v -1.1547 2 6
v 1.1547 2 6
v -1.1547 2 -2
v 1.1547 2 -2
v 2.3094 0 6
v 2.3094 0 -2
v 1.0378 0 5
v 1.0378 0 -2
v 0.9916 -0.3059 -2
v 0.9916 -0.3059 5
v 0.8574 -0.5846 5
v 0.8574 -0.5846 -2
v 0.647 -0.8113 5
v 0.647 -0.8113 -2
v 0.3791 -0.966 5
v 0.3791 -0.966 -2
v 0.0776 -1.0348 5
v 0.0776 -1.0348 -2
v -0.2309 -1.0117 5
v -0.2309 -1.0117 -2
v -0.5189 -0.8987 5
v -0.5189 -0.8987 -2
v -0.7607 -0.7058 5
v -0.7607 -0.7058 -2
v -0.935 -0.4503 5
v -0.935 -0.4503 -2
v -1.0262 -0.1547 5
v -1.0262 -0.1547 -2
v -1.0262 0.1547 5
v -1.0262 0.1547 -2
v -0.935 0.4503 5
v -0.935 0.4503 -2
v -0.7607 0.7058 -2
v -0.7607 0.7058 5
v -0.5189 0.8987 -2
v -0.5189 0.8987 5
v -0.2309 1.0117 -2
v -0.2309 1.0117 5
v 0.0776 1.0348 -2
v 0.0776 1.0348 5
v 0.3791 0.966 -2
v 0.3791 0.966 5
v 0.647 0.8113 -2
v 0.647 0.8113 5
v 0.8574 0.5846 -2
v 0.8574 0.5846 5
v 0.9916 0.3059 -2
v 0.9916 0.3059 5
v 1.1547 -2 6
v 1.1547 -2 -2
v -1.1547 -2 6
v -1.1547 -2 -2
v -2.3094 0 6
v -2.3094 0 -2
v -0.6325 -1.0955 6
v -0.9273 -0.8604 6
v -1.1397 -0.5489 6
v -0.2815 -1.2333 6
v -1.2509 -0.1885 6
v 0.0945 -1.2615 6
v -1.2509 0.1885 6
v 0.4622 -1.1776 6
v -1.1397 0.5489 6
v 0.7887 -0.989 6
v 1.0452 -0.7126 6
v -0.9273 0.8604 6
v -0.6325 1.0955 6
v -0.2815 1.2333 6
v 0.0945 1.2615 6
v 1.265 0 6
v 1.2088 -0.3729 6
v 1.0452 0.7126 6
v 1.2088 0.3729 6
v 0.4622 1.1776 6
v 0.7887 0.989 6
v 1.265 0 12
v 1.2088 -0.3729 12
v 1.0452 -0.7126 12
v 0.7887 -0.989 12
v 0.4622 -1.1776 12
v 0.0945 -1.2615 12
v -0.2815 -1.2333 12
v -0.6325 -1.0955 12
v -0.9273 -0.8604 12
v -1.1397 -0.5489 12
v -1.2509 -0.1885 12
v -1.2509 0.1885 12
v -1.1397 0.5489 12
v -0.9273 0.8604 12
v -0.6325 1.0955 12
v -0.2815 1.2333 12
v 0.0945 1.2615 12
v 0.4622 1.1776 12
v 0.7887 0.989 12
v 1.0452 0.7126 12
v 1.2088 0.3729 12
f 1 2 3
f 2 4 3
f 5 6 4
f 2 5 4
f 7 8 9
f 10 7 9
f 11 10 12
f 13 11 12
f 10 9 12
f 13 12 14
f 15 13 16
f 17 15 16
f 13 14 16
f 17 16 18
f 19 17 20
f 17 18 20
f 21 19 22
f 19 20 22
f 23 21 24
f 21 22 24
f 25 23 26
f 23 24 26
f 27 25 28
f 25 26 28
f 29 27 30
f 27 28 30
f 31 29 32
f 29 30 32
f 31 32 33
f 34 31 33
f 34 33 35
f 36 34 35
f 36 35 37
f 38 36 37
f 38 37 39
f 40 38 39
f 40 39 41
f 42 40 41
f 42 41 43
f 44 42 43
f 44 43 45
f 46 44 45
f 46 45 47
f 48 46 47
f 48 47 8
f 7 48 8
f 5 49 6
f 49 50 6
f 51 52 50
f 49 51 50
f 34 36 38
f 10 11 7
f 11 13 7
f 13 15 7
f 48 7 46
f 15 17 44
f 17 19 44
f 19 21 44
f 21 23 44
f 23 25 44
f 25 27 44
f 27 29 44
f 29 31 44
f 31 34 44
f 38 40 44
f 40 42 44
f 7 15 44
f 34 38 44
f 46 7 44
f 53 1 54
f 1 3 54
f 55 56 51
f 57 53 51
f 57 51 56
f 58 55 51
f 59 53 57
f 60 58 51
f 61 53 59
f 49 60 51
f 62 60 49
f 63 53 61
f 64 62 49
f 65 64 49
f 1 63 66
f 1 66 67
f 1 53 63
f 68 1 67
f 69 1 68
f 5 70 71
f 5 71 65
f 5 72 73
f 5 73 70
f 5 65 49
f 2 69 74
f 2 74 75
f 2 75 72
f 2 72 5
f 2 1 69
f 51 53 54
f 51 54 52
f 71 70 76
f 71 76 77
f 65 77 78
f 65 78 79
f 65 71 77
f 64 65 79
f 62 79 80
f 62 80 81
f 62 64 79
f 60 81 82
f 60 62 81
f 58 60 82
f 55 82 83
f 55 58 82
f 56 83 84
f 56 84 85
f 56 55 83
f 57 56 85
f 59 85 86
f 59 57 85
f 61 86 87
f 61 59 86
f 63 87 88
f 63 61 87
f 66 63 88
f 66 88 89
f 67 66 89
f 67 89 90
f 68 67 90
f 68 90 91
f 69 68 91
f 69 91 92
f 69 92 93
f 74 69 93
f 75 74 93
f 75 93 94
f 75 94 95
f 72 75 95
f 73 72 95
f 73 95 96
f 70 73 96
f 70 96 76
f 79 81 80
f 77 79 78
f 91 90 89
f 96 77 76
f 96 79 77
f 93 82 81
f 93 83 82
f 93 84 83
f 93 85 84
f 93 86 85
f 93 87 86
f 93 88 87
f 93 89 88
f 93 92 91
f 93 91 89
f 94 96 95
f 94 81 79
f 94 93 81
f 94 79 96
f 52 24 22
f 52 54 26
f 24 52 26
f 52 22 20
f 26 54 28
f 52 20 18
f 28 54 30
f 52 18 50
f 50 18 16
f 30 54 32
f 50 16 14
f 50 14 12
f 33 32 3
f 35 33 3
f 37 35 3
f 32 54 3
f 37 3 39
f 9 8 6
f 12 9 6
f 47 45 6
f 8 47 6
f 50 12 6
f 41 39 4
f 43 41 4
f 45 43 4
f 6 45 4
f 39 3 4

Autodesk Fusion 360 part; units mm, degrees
sketch "Sketch1" plane through (0, 0, 0) normal (0, 0, 1) x (1, 0, 0)
  circle A0 centre (0, 0) radius 1.25
  line L0 (2.3094, 0) -> (1.1547, 2)
  line L1 (1.1547, 2) -> (-1.1547, 2)
  line L2 (-1.1547, 2) -> (-2.3094, 0)
  line L3 (-2.3094, 0) -> (-1.1547, -2)
  line L4 (-1.1547, -2) -> (1.1547, -2)
  line L5 (1.1547, -2) -> (2.3094, 0)
  dimension "d1" = 2.5
  dimension "d21" = 2
extrude "Extrude6" add sketch "Sketch1" along normal blind 6
extrude "Extrude7" add sketch "Sketch1" along normal blind 7 from surface at 5 contours A0
thread "Thread1" "ISO Metric profile 2.6 M2.6x0.45 M2.6x0.45 6g" major diameter 2.53 minor diameter 2.0162 pitch 0.45 angle 60 resizes the face on face at (1.2438, -0.1245, 8)
thread "Thread2" "ISO Metric profile 2.5 M2.5x0.45 M2.5x0.45 6H" major diameter 2.58 minor diameter 2.0755 pitch 0.45 angle 60 resizes the face on face at (1.2484, 0.0623, 1.6667)
move_face "OffsetFaces2" offset 2 1 faces at (-1.4664, 0.8168, 0)
